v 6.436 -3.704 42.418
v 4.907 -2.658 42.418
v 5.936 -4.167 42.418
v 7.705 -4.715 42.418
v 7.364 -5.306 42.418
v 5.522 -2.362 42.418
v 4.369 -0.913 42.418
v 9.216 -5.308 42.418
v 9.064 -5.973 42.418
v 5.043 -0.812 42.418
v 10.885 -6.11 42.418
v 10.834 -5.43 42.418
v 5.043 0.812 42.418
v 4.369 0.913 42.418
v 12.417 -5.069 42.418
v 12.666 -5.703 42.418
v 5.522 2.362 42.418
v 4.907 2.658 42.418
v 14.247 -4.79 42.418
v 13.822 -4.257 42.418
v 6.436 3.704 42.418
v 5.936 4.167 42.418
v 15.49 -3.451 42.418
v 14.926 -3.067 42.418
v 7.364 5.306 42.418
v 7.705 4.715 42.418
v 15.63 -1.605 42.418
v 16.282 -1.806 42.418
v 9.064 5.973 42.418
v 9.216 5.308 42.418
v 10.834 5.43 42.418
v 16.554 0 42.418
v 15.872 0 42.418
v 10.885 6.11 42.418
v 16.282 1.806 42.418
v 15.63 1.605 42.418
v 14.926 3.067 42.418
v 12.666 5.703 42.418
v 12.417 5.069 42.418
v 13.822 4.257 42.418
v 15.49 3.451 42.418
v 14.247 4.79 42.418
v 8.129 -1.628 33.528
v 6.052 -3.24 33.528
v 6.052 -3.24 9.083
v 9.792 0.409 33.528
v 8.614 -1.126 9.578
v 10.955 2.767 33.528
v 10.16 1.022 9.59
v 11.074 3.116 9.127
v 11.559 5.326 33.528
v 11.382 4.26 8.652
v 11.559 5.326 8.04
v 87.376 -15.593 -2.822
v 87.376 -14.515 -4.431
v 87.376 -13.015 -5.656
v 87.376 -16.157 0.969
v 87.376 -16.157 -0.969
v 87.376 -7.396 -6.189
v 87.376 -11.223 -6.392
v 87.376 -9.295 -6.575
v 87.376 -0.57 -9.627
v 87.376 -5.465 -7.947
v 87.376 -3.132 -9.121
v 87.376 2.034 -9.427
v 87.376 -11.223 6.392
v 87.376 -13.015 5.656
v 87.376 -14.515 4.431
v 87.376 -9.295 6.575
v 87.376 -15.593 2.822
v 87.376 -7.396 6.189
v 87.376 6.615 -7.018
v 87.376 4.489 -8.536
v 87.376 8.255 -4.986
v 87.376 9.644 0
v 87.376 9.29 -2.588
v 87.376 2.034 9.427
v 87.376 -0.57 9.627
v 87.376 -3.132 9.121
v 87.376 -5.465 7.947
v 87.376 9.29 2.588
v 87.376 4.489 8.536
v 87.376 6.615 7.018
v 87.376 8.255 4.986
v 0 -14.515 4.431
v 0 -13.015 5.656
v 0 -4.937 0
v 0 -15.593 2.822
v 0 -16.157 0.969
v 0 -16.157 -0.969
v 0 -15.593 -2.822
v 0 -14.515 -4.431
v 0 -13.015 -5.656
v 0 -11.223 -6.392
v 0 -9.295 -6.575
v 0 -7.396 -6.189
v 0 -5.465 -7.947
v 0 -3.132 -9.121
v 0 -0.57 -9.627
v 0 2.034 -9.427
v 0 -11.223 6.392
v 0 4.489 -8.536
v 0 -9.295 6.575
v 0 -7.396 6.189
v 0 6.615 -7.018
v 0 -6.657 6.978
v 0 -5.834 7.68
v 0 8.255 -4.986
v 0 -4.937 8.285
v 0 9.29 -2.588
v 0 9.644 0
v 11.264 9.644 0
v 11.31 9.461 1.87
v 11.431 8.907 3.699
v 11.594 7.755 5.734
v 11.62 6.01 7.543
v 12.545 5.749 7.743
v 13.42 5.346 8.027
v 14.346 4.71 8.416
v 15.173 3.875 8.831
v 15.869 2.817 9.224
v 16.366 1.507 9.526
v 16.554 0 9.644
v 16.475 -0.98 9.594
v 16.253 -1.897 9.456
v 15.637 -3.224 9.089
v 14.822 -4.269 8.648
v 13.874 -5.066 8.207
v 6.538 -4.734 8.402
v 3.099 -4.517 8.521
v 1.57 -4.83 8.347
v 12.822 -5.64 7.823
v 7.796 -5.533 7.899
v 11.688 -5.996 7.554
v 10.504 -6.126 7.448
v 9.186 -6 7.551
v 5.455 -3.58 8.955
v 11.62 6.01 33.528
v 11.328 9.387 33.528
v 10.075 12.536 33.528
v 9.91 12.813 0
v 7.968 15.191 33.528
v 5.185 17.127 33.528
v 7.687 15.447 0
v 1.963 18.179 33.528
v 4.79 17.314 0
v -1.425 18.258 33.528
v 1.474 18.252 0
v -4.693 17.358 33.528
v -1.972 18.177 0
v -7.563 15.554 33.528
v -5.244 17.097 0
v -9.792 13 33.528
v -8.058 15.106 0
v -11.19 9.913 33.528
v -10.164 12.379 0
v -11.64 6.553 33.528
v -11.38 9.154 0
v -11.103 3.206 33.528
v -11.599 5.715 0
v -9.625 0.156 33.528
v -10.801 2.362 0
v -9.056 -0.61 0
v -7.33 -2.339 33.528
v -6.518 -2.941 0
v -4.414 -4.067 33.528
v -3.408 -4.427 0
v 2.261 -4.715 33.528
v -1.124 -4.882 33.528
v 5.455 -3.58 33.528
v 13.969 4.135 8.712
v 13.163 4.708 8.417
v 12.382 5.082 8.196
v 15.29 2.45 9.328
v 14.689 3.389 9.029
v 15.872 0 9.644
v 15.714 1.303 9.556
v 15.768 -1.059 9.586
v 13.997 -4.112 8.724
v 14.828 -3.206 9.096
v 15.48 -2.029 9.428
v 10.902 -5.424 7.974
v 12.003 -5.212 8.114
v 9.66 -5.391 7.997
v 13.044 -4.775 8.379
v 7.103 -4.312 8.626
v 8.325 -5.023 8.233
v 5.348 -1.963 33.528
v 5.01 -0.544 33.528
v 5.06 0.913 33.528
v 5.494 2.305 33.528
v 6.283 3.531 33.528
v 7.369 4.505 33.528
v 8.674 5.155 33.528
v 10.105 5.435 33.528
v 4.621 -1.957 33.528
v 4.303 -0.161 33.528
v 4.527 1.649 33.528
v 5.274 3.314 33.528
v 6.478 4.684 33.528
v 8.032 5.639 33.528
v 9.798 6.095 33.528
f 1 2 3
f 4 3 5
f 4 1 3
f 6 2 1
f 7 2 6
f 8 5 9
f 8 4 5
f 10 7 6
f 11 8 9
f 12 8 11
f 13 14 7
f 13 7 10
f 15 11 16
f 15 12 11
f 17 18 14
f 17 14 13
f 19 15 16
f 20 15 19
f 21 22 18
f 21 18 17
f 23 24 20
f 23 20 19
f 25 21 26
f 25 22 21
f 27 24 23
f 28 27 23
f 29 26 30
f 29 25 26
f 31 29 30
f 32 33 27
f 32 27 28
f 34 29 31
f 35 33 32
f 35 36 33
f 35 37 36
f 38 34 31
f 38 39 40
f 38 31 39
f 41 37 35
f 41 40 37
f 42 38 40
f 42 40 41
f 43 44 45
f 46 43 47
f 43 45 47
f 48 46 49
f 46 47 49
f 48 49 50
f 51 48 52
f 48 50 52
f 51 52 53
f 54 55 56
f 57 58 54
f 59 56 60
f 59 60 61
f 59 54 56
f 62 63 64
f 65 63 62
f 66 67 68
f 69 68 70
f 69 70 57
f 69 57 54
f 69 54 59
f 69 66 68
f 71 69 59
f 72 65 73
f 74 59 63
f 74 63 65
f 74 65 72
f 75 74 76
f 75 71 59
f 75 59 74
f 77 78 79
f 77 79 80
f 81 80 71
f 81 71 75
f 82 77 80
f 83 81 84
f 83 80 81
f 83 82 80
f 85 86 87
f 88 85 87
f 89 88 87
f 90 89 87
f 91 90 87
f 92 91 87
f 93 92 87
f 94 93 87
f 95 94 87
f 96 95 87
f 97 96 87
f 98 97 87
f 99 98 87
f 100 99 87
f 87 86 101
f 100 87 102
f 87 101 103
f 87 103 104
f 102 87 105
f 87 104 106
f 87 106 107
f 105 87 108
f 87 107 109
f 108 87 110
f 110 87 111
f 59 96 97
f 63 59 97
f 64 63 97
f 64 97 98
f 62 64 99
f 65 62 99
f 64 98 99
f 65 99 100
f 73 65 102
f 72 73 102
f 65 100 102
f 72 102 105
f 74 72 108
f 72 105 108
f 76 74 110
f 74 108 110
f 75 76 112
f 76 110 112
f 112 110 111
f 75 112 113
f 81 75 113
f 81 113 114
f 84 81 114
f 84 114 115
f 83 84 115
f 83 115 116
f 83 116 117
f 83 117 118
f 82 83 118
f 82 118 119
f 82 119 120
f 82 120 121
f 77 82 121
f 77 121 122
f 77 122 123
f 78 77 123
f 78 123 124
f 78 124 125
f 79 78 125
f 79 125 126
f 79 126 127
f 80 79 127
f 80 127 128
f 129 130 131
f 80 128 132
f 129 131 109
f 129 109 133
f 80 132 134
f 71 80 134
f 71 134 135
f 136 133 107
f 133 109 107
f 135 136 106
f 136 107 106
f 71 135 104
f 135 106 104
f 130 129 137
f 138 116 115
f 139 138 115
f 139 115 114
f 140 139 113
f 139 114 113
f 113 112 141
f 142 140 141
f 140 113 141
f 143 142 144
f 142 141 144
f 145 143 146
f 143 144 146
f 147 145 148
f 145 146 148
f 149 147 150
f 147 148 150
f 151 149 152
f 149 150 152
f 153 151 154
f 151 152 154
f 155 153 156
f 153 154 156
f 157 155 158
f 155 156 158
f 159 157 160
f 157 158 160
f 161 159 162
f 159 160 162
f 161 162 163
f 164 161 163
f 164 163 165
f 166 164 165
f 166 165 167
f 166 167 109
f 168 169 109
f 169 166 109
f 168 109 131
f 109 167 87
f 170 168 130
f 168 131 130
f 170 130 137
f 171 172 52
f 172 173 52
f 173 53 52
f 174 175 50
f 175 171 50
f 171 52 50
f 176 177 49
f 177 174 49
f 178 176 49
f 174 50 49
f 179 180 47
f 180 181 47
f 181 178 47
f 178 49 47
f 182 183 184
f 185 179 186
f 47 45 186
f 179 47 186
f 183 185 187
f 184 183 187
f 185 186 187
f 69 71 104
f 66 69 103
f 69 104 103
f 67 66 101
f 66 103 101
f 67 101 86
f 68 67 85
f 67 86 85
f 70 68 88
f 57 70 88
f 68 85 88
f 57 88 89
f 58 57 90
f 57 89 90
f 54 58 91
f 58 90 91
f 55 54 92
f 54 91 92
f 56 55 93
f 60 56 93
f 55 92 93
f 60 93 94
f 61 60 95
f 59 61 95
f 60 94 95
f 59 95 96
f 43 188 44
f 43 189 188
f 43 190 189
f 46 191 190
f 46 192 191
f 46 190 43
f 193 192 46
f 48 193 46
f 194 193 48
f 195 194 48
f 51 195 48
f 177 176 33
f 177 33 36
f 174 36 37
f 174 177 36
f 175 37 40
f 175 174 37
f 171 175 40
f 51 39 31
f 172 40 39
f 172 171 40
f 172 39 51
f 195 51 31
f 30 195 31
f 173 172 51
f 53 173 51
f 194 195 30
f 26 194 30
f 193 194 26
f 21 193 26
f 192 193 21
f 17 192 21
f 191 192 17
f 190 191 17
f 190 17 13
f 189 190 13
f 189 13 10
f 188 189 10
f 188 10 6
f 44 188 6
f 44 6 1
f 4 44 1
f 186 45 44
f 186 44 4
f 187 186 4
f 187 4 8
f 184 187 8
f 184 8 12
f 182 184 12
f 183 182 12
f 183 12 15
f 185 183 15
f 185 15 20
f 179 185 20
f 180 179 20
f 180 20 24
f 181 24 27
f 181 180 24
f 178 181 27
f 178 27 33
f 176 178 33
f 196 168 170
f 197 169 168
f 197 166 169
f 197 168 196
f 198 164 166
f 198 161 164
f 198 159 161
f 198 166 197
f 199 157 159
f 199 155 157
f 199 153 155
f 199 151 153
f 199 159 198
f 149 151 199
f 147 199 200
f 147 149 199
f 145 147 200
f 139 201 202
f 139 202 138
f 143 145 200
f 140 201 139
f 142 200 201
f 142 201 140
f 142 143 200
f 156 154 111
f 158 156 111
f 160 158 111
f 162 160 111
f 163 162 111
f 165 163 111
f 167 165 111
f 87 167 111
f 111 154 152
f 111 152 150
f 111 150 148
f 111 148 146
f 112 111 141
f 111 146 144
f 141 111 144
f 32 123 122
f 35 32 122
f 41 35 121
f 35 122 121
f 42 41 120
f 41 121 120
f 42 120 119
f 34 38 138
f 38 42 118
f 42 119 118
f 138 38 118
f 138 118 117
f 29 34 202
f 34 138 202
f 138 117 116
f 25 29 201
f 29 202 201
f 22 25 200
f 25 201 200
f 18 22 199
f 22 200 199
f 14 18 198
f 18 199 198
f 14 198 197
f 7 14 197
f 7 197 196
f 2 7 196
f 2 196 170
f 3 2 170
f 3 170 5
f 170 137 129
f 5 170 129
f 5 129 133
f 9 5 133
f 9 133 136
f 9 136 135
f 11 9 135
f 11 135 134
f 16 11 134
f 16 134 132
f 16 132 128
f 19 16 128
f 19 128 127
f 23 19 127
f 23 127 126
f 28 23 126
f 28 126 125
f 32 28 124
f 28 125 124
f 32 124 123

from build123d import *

# Parameters (mm, degrees)
F1_DEPTH = 36.576
F2_R     = 6.1269141817
F2_R_2   = 5.4449422531
F3_DEPTH = 42.418
F4_DEPTH = 25.4
F5_DEPTH = 25.4
F6_R     = 11.6411765601
F7_DEPTH = 33.528


with BuildPart() as f1:
    # F0 (on Right) → F1 (new body)
    with BuildSketch(Plane.YZ):
        with BuildLine():
            ThreePointArc((-7.3964224414, -6.1888854819), (3.2922075385, -9.0648076628), (9.6441364797, 0))
            ThreePointArc((9.6441364797, 0), (3.2922075385, 9.0648076628), (-7.3964224414, 6.1888854819))
            ThreePointArc((-7.3964224414, 6.1888854819), (-4.251808406, 3.7785340877), (-3.0597214027, 0))
            ThreePointArc((-3.0597214027, 0), (-4.251808406, -3.7785340877), (-7.3964224414, -6.1888854819))
        make_face()
        with BuildLine():
            ThreePointArc((-3.0597214027, 0), (-4.251808406, 3.7785340877), (-7.3964224414, 6.1888854819))
            ThreePointArc((-7.3964224414, 6.1888854819), (-9.6441364797, 0), (-7.3964224414, -6.1888854819))
            ThreePointArc((-7.3964224414, -6.1888854819), (-4.251808406, -3.7785340877), (-3.0597214027, 0))
        make_face()
        with BuildLine():
            ThreePointArc((-7.3964224414, -6.1888854819), (-9.6441364797, 0), (-7.3964224414, 6.1888854819))
            ThreePointArc((-7.3964224414, 6.1888854819), (-16.2285515567, 0), (-7.3964224414, -6.1888854819))
        make_face()
    extrude(amount=F1_DEPTH)

    # F2 (on Top) → F3 (join)
    with BuildSketch(Plane.XY):
        with Locations((10.4273650795, 0)):
            Circle(F2_R)
        with Locations((10.4273650795, 0)):
            Circle(F2_R_2, mode=Mode.SUBTRACT)
    extrude(amount=F3_DEPTH)

    # F4 (add): a face of the model
    f4_faces = [f1.faces().sort_by_distance(p)[0] for p in [
        (36.576, -2.5293914457, 0),
    ]]
    extrude(f4_faces, amount=F4_DEPTH)

    # F5 (add): a face of the model
    f5_faces = [f1.faces().sort_by_distance(p)[0] for p in [
        (61.976, -2.5293914457, 0),
    ]]
    extrude(f5_faces, amount=F5_DEPTH)

    # F6 (on Top) → F7 (join)
    with BuildSketch(Plane.XY):
        with Locations((0, 6.7043649033)):
            Circle(F6_R)
    extrude(amount=F7_DEPTH)


solid = f1.part
